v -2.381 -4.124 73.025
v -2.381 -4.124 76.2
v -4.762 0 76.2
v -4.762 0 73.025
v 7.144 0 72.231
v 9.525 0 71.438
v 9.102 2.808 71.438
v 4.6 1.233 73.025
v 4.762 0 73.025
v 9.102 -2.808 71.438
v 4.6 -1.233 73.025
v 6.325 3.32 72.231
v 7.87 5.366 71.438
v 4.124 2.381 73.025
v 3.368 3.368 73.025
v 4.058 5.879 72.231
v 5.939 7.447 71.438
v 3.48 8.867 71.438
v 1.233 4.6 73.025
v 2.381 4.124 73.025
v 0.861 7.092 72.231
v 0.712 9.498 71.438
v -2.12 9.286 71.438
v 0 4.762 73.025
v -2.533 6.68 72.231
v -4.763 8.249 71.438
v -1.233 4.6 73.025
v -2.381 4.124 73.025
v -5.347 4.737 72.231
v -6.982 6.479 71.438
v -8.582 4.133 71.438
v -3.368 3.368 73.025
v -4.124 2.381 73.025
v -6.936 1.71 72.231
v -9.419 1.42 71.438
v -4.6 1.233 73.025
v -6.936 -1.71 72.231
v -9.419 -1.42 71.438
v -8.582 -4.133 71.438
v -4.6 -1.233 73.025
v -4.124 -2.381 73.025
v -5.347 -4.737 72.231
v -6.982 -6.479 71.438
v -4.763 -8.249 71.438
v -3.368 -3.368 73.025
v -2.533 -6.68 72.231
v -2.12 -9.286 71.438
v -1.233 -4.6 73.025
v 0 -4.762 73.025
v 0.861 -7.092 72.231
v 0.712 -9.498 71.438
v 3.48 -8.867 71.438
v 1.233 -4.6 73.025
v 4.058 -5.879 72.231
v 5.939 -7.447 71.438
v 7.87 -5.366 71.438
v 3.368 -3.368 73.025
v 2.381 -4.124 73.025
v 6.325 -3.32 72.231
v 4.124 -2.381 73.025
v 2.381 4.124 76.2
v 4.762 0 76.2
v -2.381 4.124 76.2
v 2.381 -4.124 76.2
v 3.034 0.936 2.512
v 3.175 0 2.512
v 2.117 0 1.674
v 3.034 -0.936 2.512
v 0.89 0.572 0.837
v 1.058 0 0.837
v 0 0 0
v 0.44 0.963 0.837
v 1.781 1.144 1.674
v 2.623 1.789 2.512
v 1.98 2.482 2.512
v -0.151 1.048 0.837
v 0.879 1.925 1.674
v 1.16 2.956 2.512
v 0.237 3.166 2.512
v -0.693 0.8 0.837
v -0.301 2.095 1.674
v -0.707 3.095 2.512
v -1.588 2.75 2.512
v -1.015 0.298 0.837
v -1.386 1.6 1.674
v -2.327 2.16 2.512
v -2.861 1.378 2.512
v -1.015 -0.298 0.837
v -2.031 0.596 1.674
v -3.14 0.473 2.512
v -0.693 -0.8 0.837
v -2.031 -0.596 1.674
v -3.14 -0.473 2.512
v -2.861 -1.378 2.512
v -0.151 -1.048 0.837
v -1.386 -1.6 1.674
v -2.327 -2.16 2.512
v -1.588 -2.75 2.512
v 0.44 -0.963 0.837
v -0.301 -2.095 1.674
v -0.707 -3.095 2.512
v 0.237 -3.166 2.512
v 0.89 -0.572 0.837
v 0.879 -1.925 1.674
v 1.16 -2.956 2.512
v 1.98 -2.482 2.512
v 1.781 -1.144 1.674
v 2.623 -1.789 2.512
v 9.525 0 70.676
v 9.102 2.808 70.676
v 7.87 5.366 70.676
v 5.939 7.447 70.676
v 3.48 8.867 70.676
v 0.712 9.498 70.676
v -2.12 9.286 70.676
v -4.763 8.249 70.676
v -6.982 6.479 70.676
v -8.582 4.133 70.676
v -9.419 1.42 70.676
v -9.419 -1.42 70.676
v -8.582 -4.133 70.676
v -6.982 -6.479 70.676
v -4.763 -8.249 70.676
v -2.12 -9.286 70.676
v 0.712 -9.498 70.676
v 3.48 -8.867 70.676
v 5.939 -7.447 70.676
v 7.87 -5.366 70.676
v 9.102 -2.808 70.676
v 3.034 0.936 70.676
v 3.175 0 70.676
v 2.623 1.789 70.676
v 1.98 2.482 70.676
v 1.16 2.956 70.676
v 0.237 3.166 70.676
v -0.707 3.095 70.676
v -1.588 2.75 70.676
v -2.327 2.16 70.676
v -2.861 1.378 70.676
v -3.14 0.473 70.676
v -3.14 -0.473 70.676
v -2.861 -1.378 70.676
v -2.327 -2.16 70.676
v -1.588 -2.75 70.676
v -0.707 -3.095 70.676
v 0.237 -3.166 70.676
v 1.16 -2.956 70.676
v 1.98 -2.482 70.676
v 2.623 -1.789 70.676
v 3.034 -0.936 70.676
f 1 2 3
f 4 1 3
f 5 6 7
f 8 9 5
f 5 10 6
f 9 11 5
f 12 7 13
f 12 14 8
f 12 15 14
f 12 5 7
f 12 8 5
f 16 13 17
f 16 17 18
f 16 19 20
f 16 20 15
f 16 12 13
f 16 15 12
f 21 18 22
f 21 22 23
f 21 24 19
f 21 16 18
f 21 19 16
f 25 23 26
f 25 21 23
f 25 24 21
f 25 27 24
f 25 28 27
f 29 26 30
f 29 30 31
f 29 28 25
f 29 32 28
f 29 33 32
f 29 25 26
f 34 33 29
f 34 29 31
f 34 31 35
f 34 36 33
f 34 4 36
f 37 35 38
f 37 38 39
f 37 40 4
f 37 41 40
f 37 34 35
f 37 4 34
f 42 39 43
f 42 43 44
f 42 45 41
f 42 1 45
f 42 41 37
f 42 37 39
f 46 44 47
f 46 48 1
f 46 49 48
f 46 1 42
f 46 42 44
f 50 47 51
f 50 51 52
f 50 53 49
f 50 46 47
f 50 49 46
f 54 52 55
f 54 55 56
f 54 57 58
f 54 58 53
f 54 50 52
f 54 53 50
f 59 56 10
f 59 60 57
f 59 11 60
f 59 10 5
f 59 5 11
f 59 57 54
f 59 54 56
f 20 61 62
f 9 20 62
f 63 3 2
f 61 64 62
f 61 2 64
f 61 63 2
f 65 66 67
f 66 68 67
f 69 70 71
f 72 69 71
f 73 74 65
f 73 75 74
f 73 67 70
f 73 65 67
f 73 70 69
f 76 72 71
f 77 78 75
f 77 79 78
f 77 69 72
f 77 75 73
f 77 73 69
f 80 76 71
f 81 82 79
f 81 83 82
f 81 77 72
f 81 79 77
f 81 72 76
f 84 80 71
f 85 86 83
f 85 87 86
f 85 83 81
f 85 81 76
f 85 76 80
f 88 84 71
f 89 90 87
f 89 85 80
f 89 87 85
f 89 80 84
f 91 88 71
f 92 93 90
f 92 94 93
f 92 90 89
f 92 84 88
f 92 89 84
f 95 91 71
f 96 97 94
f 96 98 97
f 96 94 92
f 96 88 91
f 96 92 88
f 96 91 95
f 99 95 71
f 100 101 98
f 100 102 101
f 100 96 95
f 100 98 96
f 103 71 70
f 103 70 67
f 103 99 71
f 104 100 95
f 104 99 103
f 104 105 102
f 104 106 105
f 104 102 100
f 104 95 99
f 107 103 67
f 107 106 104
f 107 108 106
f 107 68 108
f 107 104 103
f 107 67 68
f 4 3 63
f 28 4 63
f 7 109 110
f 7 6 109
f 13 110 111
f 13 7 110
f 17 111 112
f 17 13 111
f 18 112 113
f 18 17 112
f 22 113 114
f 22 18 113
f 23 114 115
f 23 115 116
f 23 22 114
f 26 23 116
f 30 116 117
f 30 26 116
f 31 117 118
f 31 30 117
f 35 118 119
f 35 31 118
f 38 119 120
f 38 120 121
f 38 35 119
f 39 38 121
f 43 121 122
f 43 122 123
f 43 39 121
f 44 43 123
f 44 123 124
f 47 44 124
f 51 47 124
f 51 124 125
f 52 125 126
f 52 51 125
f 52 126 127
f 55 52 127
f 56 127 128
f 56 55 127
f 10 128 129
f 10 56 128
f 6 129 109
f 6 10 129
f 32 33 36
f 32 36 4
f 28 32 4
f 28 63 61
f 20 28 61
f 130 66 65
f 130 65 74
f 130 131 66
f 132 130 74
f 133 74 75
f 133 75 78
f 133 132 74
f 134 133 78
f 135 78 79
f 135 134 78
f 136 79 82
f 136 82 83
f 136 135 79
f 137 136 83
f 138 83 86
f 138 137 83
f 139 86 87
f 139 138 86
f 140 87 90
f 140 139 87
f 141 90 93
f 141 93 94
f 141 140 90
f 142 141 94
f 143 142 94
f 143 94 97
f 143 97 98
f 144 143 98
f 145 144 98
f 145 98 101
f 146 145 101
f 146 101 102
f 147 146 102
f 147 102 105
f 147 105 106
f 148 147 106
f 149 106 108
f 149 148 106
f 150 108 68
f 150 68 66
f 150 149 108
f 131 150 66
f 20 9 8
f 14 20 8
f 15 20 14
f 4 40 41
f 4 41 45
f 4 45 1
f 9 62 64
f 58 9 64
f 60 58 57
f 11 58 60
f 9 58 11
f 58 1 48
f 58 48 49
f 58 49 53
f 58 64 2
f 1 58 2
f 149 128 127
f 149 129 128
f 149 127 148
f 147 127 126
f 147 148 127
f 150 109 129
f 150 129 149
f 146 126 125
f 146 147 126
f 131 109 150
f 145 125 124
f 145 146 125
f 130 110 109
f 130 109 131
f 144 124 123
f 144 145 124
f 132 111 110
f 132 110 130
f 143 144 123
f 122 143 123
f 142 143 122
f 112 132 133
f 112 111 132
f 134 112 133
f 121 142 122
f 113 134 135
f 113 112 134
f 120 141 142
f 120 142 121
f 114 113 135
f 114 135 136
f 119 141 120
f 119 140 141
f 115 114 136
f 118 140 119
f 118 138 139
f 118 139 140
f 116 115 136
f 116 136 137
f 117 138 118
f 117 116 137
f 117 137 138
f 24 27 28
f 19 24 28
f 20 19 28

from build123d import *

# Parameters (mm, degrees)
F2_R     = 10.2989039919
F3_DEPTH = 3.175


# Not quite as in the source:
# - a length typed as a fraction of an inch, garbled in the dataset ("3 / 203.2 mm" for 3/8 in), is restored


with BuildPart() as f1:
    # F0 (on Front) → F1 (revolve)
    with BuildSketch(Plane.XZ):
        Polygon((0, 76.2), (0, 0), (3.175, 2.5115670547), (3.175, 70.6755), (9.525, 70.6755), (9.525, 71.4375), (4.7625, 73.025), (4.7625, 76.2), align=None)
    revolve(axis=Axis((0, 0, 38.1), (0, 0, 1)))

    # F2 (on face) → F3 (cut)
    with BuildSketch(Plane.XY.offset(76.2)):
        Circle(F2_R)
        Polygon((-4.7625, 0), (-2.38125, 4.1244459855), (2.38125, 4.1244459855), (4.7625, 0), (2.38125, -4.1244459855), (-2.38125, -4.1244459855), align=None, mode=Mode.SUBTRACT)
    extrude(amount=-F3_DEPTH, mode=Mode.SUBTRACT)


solid = f1.part
